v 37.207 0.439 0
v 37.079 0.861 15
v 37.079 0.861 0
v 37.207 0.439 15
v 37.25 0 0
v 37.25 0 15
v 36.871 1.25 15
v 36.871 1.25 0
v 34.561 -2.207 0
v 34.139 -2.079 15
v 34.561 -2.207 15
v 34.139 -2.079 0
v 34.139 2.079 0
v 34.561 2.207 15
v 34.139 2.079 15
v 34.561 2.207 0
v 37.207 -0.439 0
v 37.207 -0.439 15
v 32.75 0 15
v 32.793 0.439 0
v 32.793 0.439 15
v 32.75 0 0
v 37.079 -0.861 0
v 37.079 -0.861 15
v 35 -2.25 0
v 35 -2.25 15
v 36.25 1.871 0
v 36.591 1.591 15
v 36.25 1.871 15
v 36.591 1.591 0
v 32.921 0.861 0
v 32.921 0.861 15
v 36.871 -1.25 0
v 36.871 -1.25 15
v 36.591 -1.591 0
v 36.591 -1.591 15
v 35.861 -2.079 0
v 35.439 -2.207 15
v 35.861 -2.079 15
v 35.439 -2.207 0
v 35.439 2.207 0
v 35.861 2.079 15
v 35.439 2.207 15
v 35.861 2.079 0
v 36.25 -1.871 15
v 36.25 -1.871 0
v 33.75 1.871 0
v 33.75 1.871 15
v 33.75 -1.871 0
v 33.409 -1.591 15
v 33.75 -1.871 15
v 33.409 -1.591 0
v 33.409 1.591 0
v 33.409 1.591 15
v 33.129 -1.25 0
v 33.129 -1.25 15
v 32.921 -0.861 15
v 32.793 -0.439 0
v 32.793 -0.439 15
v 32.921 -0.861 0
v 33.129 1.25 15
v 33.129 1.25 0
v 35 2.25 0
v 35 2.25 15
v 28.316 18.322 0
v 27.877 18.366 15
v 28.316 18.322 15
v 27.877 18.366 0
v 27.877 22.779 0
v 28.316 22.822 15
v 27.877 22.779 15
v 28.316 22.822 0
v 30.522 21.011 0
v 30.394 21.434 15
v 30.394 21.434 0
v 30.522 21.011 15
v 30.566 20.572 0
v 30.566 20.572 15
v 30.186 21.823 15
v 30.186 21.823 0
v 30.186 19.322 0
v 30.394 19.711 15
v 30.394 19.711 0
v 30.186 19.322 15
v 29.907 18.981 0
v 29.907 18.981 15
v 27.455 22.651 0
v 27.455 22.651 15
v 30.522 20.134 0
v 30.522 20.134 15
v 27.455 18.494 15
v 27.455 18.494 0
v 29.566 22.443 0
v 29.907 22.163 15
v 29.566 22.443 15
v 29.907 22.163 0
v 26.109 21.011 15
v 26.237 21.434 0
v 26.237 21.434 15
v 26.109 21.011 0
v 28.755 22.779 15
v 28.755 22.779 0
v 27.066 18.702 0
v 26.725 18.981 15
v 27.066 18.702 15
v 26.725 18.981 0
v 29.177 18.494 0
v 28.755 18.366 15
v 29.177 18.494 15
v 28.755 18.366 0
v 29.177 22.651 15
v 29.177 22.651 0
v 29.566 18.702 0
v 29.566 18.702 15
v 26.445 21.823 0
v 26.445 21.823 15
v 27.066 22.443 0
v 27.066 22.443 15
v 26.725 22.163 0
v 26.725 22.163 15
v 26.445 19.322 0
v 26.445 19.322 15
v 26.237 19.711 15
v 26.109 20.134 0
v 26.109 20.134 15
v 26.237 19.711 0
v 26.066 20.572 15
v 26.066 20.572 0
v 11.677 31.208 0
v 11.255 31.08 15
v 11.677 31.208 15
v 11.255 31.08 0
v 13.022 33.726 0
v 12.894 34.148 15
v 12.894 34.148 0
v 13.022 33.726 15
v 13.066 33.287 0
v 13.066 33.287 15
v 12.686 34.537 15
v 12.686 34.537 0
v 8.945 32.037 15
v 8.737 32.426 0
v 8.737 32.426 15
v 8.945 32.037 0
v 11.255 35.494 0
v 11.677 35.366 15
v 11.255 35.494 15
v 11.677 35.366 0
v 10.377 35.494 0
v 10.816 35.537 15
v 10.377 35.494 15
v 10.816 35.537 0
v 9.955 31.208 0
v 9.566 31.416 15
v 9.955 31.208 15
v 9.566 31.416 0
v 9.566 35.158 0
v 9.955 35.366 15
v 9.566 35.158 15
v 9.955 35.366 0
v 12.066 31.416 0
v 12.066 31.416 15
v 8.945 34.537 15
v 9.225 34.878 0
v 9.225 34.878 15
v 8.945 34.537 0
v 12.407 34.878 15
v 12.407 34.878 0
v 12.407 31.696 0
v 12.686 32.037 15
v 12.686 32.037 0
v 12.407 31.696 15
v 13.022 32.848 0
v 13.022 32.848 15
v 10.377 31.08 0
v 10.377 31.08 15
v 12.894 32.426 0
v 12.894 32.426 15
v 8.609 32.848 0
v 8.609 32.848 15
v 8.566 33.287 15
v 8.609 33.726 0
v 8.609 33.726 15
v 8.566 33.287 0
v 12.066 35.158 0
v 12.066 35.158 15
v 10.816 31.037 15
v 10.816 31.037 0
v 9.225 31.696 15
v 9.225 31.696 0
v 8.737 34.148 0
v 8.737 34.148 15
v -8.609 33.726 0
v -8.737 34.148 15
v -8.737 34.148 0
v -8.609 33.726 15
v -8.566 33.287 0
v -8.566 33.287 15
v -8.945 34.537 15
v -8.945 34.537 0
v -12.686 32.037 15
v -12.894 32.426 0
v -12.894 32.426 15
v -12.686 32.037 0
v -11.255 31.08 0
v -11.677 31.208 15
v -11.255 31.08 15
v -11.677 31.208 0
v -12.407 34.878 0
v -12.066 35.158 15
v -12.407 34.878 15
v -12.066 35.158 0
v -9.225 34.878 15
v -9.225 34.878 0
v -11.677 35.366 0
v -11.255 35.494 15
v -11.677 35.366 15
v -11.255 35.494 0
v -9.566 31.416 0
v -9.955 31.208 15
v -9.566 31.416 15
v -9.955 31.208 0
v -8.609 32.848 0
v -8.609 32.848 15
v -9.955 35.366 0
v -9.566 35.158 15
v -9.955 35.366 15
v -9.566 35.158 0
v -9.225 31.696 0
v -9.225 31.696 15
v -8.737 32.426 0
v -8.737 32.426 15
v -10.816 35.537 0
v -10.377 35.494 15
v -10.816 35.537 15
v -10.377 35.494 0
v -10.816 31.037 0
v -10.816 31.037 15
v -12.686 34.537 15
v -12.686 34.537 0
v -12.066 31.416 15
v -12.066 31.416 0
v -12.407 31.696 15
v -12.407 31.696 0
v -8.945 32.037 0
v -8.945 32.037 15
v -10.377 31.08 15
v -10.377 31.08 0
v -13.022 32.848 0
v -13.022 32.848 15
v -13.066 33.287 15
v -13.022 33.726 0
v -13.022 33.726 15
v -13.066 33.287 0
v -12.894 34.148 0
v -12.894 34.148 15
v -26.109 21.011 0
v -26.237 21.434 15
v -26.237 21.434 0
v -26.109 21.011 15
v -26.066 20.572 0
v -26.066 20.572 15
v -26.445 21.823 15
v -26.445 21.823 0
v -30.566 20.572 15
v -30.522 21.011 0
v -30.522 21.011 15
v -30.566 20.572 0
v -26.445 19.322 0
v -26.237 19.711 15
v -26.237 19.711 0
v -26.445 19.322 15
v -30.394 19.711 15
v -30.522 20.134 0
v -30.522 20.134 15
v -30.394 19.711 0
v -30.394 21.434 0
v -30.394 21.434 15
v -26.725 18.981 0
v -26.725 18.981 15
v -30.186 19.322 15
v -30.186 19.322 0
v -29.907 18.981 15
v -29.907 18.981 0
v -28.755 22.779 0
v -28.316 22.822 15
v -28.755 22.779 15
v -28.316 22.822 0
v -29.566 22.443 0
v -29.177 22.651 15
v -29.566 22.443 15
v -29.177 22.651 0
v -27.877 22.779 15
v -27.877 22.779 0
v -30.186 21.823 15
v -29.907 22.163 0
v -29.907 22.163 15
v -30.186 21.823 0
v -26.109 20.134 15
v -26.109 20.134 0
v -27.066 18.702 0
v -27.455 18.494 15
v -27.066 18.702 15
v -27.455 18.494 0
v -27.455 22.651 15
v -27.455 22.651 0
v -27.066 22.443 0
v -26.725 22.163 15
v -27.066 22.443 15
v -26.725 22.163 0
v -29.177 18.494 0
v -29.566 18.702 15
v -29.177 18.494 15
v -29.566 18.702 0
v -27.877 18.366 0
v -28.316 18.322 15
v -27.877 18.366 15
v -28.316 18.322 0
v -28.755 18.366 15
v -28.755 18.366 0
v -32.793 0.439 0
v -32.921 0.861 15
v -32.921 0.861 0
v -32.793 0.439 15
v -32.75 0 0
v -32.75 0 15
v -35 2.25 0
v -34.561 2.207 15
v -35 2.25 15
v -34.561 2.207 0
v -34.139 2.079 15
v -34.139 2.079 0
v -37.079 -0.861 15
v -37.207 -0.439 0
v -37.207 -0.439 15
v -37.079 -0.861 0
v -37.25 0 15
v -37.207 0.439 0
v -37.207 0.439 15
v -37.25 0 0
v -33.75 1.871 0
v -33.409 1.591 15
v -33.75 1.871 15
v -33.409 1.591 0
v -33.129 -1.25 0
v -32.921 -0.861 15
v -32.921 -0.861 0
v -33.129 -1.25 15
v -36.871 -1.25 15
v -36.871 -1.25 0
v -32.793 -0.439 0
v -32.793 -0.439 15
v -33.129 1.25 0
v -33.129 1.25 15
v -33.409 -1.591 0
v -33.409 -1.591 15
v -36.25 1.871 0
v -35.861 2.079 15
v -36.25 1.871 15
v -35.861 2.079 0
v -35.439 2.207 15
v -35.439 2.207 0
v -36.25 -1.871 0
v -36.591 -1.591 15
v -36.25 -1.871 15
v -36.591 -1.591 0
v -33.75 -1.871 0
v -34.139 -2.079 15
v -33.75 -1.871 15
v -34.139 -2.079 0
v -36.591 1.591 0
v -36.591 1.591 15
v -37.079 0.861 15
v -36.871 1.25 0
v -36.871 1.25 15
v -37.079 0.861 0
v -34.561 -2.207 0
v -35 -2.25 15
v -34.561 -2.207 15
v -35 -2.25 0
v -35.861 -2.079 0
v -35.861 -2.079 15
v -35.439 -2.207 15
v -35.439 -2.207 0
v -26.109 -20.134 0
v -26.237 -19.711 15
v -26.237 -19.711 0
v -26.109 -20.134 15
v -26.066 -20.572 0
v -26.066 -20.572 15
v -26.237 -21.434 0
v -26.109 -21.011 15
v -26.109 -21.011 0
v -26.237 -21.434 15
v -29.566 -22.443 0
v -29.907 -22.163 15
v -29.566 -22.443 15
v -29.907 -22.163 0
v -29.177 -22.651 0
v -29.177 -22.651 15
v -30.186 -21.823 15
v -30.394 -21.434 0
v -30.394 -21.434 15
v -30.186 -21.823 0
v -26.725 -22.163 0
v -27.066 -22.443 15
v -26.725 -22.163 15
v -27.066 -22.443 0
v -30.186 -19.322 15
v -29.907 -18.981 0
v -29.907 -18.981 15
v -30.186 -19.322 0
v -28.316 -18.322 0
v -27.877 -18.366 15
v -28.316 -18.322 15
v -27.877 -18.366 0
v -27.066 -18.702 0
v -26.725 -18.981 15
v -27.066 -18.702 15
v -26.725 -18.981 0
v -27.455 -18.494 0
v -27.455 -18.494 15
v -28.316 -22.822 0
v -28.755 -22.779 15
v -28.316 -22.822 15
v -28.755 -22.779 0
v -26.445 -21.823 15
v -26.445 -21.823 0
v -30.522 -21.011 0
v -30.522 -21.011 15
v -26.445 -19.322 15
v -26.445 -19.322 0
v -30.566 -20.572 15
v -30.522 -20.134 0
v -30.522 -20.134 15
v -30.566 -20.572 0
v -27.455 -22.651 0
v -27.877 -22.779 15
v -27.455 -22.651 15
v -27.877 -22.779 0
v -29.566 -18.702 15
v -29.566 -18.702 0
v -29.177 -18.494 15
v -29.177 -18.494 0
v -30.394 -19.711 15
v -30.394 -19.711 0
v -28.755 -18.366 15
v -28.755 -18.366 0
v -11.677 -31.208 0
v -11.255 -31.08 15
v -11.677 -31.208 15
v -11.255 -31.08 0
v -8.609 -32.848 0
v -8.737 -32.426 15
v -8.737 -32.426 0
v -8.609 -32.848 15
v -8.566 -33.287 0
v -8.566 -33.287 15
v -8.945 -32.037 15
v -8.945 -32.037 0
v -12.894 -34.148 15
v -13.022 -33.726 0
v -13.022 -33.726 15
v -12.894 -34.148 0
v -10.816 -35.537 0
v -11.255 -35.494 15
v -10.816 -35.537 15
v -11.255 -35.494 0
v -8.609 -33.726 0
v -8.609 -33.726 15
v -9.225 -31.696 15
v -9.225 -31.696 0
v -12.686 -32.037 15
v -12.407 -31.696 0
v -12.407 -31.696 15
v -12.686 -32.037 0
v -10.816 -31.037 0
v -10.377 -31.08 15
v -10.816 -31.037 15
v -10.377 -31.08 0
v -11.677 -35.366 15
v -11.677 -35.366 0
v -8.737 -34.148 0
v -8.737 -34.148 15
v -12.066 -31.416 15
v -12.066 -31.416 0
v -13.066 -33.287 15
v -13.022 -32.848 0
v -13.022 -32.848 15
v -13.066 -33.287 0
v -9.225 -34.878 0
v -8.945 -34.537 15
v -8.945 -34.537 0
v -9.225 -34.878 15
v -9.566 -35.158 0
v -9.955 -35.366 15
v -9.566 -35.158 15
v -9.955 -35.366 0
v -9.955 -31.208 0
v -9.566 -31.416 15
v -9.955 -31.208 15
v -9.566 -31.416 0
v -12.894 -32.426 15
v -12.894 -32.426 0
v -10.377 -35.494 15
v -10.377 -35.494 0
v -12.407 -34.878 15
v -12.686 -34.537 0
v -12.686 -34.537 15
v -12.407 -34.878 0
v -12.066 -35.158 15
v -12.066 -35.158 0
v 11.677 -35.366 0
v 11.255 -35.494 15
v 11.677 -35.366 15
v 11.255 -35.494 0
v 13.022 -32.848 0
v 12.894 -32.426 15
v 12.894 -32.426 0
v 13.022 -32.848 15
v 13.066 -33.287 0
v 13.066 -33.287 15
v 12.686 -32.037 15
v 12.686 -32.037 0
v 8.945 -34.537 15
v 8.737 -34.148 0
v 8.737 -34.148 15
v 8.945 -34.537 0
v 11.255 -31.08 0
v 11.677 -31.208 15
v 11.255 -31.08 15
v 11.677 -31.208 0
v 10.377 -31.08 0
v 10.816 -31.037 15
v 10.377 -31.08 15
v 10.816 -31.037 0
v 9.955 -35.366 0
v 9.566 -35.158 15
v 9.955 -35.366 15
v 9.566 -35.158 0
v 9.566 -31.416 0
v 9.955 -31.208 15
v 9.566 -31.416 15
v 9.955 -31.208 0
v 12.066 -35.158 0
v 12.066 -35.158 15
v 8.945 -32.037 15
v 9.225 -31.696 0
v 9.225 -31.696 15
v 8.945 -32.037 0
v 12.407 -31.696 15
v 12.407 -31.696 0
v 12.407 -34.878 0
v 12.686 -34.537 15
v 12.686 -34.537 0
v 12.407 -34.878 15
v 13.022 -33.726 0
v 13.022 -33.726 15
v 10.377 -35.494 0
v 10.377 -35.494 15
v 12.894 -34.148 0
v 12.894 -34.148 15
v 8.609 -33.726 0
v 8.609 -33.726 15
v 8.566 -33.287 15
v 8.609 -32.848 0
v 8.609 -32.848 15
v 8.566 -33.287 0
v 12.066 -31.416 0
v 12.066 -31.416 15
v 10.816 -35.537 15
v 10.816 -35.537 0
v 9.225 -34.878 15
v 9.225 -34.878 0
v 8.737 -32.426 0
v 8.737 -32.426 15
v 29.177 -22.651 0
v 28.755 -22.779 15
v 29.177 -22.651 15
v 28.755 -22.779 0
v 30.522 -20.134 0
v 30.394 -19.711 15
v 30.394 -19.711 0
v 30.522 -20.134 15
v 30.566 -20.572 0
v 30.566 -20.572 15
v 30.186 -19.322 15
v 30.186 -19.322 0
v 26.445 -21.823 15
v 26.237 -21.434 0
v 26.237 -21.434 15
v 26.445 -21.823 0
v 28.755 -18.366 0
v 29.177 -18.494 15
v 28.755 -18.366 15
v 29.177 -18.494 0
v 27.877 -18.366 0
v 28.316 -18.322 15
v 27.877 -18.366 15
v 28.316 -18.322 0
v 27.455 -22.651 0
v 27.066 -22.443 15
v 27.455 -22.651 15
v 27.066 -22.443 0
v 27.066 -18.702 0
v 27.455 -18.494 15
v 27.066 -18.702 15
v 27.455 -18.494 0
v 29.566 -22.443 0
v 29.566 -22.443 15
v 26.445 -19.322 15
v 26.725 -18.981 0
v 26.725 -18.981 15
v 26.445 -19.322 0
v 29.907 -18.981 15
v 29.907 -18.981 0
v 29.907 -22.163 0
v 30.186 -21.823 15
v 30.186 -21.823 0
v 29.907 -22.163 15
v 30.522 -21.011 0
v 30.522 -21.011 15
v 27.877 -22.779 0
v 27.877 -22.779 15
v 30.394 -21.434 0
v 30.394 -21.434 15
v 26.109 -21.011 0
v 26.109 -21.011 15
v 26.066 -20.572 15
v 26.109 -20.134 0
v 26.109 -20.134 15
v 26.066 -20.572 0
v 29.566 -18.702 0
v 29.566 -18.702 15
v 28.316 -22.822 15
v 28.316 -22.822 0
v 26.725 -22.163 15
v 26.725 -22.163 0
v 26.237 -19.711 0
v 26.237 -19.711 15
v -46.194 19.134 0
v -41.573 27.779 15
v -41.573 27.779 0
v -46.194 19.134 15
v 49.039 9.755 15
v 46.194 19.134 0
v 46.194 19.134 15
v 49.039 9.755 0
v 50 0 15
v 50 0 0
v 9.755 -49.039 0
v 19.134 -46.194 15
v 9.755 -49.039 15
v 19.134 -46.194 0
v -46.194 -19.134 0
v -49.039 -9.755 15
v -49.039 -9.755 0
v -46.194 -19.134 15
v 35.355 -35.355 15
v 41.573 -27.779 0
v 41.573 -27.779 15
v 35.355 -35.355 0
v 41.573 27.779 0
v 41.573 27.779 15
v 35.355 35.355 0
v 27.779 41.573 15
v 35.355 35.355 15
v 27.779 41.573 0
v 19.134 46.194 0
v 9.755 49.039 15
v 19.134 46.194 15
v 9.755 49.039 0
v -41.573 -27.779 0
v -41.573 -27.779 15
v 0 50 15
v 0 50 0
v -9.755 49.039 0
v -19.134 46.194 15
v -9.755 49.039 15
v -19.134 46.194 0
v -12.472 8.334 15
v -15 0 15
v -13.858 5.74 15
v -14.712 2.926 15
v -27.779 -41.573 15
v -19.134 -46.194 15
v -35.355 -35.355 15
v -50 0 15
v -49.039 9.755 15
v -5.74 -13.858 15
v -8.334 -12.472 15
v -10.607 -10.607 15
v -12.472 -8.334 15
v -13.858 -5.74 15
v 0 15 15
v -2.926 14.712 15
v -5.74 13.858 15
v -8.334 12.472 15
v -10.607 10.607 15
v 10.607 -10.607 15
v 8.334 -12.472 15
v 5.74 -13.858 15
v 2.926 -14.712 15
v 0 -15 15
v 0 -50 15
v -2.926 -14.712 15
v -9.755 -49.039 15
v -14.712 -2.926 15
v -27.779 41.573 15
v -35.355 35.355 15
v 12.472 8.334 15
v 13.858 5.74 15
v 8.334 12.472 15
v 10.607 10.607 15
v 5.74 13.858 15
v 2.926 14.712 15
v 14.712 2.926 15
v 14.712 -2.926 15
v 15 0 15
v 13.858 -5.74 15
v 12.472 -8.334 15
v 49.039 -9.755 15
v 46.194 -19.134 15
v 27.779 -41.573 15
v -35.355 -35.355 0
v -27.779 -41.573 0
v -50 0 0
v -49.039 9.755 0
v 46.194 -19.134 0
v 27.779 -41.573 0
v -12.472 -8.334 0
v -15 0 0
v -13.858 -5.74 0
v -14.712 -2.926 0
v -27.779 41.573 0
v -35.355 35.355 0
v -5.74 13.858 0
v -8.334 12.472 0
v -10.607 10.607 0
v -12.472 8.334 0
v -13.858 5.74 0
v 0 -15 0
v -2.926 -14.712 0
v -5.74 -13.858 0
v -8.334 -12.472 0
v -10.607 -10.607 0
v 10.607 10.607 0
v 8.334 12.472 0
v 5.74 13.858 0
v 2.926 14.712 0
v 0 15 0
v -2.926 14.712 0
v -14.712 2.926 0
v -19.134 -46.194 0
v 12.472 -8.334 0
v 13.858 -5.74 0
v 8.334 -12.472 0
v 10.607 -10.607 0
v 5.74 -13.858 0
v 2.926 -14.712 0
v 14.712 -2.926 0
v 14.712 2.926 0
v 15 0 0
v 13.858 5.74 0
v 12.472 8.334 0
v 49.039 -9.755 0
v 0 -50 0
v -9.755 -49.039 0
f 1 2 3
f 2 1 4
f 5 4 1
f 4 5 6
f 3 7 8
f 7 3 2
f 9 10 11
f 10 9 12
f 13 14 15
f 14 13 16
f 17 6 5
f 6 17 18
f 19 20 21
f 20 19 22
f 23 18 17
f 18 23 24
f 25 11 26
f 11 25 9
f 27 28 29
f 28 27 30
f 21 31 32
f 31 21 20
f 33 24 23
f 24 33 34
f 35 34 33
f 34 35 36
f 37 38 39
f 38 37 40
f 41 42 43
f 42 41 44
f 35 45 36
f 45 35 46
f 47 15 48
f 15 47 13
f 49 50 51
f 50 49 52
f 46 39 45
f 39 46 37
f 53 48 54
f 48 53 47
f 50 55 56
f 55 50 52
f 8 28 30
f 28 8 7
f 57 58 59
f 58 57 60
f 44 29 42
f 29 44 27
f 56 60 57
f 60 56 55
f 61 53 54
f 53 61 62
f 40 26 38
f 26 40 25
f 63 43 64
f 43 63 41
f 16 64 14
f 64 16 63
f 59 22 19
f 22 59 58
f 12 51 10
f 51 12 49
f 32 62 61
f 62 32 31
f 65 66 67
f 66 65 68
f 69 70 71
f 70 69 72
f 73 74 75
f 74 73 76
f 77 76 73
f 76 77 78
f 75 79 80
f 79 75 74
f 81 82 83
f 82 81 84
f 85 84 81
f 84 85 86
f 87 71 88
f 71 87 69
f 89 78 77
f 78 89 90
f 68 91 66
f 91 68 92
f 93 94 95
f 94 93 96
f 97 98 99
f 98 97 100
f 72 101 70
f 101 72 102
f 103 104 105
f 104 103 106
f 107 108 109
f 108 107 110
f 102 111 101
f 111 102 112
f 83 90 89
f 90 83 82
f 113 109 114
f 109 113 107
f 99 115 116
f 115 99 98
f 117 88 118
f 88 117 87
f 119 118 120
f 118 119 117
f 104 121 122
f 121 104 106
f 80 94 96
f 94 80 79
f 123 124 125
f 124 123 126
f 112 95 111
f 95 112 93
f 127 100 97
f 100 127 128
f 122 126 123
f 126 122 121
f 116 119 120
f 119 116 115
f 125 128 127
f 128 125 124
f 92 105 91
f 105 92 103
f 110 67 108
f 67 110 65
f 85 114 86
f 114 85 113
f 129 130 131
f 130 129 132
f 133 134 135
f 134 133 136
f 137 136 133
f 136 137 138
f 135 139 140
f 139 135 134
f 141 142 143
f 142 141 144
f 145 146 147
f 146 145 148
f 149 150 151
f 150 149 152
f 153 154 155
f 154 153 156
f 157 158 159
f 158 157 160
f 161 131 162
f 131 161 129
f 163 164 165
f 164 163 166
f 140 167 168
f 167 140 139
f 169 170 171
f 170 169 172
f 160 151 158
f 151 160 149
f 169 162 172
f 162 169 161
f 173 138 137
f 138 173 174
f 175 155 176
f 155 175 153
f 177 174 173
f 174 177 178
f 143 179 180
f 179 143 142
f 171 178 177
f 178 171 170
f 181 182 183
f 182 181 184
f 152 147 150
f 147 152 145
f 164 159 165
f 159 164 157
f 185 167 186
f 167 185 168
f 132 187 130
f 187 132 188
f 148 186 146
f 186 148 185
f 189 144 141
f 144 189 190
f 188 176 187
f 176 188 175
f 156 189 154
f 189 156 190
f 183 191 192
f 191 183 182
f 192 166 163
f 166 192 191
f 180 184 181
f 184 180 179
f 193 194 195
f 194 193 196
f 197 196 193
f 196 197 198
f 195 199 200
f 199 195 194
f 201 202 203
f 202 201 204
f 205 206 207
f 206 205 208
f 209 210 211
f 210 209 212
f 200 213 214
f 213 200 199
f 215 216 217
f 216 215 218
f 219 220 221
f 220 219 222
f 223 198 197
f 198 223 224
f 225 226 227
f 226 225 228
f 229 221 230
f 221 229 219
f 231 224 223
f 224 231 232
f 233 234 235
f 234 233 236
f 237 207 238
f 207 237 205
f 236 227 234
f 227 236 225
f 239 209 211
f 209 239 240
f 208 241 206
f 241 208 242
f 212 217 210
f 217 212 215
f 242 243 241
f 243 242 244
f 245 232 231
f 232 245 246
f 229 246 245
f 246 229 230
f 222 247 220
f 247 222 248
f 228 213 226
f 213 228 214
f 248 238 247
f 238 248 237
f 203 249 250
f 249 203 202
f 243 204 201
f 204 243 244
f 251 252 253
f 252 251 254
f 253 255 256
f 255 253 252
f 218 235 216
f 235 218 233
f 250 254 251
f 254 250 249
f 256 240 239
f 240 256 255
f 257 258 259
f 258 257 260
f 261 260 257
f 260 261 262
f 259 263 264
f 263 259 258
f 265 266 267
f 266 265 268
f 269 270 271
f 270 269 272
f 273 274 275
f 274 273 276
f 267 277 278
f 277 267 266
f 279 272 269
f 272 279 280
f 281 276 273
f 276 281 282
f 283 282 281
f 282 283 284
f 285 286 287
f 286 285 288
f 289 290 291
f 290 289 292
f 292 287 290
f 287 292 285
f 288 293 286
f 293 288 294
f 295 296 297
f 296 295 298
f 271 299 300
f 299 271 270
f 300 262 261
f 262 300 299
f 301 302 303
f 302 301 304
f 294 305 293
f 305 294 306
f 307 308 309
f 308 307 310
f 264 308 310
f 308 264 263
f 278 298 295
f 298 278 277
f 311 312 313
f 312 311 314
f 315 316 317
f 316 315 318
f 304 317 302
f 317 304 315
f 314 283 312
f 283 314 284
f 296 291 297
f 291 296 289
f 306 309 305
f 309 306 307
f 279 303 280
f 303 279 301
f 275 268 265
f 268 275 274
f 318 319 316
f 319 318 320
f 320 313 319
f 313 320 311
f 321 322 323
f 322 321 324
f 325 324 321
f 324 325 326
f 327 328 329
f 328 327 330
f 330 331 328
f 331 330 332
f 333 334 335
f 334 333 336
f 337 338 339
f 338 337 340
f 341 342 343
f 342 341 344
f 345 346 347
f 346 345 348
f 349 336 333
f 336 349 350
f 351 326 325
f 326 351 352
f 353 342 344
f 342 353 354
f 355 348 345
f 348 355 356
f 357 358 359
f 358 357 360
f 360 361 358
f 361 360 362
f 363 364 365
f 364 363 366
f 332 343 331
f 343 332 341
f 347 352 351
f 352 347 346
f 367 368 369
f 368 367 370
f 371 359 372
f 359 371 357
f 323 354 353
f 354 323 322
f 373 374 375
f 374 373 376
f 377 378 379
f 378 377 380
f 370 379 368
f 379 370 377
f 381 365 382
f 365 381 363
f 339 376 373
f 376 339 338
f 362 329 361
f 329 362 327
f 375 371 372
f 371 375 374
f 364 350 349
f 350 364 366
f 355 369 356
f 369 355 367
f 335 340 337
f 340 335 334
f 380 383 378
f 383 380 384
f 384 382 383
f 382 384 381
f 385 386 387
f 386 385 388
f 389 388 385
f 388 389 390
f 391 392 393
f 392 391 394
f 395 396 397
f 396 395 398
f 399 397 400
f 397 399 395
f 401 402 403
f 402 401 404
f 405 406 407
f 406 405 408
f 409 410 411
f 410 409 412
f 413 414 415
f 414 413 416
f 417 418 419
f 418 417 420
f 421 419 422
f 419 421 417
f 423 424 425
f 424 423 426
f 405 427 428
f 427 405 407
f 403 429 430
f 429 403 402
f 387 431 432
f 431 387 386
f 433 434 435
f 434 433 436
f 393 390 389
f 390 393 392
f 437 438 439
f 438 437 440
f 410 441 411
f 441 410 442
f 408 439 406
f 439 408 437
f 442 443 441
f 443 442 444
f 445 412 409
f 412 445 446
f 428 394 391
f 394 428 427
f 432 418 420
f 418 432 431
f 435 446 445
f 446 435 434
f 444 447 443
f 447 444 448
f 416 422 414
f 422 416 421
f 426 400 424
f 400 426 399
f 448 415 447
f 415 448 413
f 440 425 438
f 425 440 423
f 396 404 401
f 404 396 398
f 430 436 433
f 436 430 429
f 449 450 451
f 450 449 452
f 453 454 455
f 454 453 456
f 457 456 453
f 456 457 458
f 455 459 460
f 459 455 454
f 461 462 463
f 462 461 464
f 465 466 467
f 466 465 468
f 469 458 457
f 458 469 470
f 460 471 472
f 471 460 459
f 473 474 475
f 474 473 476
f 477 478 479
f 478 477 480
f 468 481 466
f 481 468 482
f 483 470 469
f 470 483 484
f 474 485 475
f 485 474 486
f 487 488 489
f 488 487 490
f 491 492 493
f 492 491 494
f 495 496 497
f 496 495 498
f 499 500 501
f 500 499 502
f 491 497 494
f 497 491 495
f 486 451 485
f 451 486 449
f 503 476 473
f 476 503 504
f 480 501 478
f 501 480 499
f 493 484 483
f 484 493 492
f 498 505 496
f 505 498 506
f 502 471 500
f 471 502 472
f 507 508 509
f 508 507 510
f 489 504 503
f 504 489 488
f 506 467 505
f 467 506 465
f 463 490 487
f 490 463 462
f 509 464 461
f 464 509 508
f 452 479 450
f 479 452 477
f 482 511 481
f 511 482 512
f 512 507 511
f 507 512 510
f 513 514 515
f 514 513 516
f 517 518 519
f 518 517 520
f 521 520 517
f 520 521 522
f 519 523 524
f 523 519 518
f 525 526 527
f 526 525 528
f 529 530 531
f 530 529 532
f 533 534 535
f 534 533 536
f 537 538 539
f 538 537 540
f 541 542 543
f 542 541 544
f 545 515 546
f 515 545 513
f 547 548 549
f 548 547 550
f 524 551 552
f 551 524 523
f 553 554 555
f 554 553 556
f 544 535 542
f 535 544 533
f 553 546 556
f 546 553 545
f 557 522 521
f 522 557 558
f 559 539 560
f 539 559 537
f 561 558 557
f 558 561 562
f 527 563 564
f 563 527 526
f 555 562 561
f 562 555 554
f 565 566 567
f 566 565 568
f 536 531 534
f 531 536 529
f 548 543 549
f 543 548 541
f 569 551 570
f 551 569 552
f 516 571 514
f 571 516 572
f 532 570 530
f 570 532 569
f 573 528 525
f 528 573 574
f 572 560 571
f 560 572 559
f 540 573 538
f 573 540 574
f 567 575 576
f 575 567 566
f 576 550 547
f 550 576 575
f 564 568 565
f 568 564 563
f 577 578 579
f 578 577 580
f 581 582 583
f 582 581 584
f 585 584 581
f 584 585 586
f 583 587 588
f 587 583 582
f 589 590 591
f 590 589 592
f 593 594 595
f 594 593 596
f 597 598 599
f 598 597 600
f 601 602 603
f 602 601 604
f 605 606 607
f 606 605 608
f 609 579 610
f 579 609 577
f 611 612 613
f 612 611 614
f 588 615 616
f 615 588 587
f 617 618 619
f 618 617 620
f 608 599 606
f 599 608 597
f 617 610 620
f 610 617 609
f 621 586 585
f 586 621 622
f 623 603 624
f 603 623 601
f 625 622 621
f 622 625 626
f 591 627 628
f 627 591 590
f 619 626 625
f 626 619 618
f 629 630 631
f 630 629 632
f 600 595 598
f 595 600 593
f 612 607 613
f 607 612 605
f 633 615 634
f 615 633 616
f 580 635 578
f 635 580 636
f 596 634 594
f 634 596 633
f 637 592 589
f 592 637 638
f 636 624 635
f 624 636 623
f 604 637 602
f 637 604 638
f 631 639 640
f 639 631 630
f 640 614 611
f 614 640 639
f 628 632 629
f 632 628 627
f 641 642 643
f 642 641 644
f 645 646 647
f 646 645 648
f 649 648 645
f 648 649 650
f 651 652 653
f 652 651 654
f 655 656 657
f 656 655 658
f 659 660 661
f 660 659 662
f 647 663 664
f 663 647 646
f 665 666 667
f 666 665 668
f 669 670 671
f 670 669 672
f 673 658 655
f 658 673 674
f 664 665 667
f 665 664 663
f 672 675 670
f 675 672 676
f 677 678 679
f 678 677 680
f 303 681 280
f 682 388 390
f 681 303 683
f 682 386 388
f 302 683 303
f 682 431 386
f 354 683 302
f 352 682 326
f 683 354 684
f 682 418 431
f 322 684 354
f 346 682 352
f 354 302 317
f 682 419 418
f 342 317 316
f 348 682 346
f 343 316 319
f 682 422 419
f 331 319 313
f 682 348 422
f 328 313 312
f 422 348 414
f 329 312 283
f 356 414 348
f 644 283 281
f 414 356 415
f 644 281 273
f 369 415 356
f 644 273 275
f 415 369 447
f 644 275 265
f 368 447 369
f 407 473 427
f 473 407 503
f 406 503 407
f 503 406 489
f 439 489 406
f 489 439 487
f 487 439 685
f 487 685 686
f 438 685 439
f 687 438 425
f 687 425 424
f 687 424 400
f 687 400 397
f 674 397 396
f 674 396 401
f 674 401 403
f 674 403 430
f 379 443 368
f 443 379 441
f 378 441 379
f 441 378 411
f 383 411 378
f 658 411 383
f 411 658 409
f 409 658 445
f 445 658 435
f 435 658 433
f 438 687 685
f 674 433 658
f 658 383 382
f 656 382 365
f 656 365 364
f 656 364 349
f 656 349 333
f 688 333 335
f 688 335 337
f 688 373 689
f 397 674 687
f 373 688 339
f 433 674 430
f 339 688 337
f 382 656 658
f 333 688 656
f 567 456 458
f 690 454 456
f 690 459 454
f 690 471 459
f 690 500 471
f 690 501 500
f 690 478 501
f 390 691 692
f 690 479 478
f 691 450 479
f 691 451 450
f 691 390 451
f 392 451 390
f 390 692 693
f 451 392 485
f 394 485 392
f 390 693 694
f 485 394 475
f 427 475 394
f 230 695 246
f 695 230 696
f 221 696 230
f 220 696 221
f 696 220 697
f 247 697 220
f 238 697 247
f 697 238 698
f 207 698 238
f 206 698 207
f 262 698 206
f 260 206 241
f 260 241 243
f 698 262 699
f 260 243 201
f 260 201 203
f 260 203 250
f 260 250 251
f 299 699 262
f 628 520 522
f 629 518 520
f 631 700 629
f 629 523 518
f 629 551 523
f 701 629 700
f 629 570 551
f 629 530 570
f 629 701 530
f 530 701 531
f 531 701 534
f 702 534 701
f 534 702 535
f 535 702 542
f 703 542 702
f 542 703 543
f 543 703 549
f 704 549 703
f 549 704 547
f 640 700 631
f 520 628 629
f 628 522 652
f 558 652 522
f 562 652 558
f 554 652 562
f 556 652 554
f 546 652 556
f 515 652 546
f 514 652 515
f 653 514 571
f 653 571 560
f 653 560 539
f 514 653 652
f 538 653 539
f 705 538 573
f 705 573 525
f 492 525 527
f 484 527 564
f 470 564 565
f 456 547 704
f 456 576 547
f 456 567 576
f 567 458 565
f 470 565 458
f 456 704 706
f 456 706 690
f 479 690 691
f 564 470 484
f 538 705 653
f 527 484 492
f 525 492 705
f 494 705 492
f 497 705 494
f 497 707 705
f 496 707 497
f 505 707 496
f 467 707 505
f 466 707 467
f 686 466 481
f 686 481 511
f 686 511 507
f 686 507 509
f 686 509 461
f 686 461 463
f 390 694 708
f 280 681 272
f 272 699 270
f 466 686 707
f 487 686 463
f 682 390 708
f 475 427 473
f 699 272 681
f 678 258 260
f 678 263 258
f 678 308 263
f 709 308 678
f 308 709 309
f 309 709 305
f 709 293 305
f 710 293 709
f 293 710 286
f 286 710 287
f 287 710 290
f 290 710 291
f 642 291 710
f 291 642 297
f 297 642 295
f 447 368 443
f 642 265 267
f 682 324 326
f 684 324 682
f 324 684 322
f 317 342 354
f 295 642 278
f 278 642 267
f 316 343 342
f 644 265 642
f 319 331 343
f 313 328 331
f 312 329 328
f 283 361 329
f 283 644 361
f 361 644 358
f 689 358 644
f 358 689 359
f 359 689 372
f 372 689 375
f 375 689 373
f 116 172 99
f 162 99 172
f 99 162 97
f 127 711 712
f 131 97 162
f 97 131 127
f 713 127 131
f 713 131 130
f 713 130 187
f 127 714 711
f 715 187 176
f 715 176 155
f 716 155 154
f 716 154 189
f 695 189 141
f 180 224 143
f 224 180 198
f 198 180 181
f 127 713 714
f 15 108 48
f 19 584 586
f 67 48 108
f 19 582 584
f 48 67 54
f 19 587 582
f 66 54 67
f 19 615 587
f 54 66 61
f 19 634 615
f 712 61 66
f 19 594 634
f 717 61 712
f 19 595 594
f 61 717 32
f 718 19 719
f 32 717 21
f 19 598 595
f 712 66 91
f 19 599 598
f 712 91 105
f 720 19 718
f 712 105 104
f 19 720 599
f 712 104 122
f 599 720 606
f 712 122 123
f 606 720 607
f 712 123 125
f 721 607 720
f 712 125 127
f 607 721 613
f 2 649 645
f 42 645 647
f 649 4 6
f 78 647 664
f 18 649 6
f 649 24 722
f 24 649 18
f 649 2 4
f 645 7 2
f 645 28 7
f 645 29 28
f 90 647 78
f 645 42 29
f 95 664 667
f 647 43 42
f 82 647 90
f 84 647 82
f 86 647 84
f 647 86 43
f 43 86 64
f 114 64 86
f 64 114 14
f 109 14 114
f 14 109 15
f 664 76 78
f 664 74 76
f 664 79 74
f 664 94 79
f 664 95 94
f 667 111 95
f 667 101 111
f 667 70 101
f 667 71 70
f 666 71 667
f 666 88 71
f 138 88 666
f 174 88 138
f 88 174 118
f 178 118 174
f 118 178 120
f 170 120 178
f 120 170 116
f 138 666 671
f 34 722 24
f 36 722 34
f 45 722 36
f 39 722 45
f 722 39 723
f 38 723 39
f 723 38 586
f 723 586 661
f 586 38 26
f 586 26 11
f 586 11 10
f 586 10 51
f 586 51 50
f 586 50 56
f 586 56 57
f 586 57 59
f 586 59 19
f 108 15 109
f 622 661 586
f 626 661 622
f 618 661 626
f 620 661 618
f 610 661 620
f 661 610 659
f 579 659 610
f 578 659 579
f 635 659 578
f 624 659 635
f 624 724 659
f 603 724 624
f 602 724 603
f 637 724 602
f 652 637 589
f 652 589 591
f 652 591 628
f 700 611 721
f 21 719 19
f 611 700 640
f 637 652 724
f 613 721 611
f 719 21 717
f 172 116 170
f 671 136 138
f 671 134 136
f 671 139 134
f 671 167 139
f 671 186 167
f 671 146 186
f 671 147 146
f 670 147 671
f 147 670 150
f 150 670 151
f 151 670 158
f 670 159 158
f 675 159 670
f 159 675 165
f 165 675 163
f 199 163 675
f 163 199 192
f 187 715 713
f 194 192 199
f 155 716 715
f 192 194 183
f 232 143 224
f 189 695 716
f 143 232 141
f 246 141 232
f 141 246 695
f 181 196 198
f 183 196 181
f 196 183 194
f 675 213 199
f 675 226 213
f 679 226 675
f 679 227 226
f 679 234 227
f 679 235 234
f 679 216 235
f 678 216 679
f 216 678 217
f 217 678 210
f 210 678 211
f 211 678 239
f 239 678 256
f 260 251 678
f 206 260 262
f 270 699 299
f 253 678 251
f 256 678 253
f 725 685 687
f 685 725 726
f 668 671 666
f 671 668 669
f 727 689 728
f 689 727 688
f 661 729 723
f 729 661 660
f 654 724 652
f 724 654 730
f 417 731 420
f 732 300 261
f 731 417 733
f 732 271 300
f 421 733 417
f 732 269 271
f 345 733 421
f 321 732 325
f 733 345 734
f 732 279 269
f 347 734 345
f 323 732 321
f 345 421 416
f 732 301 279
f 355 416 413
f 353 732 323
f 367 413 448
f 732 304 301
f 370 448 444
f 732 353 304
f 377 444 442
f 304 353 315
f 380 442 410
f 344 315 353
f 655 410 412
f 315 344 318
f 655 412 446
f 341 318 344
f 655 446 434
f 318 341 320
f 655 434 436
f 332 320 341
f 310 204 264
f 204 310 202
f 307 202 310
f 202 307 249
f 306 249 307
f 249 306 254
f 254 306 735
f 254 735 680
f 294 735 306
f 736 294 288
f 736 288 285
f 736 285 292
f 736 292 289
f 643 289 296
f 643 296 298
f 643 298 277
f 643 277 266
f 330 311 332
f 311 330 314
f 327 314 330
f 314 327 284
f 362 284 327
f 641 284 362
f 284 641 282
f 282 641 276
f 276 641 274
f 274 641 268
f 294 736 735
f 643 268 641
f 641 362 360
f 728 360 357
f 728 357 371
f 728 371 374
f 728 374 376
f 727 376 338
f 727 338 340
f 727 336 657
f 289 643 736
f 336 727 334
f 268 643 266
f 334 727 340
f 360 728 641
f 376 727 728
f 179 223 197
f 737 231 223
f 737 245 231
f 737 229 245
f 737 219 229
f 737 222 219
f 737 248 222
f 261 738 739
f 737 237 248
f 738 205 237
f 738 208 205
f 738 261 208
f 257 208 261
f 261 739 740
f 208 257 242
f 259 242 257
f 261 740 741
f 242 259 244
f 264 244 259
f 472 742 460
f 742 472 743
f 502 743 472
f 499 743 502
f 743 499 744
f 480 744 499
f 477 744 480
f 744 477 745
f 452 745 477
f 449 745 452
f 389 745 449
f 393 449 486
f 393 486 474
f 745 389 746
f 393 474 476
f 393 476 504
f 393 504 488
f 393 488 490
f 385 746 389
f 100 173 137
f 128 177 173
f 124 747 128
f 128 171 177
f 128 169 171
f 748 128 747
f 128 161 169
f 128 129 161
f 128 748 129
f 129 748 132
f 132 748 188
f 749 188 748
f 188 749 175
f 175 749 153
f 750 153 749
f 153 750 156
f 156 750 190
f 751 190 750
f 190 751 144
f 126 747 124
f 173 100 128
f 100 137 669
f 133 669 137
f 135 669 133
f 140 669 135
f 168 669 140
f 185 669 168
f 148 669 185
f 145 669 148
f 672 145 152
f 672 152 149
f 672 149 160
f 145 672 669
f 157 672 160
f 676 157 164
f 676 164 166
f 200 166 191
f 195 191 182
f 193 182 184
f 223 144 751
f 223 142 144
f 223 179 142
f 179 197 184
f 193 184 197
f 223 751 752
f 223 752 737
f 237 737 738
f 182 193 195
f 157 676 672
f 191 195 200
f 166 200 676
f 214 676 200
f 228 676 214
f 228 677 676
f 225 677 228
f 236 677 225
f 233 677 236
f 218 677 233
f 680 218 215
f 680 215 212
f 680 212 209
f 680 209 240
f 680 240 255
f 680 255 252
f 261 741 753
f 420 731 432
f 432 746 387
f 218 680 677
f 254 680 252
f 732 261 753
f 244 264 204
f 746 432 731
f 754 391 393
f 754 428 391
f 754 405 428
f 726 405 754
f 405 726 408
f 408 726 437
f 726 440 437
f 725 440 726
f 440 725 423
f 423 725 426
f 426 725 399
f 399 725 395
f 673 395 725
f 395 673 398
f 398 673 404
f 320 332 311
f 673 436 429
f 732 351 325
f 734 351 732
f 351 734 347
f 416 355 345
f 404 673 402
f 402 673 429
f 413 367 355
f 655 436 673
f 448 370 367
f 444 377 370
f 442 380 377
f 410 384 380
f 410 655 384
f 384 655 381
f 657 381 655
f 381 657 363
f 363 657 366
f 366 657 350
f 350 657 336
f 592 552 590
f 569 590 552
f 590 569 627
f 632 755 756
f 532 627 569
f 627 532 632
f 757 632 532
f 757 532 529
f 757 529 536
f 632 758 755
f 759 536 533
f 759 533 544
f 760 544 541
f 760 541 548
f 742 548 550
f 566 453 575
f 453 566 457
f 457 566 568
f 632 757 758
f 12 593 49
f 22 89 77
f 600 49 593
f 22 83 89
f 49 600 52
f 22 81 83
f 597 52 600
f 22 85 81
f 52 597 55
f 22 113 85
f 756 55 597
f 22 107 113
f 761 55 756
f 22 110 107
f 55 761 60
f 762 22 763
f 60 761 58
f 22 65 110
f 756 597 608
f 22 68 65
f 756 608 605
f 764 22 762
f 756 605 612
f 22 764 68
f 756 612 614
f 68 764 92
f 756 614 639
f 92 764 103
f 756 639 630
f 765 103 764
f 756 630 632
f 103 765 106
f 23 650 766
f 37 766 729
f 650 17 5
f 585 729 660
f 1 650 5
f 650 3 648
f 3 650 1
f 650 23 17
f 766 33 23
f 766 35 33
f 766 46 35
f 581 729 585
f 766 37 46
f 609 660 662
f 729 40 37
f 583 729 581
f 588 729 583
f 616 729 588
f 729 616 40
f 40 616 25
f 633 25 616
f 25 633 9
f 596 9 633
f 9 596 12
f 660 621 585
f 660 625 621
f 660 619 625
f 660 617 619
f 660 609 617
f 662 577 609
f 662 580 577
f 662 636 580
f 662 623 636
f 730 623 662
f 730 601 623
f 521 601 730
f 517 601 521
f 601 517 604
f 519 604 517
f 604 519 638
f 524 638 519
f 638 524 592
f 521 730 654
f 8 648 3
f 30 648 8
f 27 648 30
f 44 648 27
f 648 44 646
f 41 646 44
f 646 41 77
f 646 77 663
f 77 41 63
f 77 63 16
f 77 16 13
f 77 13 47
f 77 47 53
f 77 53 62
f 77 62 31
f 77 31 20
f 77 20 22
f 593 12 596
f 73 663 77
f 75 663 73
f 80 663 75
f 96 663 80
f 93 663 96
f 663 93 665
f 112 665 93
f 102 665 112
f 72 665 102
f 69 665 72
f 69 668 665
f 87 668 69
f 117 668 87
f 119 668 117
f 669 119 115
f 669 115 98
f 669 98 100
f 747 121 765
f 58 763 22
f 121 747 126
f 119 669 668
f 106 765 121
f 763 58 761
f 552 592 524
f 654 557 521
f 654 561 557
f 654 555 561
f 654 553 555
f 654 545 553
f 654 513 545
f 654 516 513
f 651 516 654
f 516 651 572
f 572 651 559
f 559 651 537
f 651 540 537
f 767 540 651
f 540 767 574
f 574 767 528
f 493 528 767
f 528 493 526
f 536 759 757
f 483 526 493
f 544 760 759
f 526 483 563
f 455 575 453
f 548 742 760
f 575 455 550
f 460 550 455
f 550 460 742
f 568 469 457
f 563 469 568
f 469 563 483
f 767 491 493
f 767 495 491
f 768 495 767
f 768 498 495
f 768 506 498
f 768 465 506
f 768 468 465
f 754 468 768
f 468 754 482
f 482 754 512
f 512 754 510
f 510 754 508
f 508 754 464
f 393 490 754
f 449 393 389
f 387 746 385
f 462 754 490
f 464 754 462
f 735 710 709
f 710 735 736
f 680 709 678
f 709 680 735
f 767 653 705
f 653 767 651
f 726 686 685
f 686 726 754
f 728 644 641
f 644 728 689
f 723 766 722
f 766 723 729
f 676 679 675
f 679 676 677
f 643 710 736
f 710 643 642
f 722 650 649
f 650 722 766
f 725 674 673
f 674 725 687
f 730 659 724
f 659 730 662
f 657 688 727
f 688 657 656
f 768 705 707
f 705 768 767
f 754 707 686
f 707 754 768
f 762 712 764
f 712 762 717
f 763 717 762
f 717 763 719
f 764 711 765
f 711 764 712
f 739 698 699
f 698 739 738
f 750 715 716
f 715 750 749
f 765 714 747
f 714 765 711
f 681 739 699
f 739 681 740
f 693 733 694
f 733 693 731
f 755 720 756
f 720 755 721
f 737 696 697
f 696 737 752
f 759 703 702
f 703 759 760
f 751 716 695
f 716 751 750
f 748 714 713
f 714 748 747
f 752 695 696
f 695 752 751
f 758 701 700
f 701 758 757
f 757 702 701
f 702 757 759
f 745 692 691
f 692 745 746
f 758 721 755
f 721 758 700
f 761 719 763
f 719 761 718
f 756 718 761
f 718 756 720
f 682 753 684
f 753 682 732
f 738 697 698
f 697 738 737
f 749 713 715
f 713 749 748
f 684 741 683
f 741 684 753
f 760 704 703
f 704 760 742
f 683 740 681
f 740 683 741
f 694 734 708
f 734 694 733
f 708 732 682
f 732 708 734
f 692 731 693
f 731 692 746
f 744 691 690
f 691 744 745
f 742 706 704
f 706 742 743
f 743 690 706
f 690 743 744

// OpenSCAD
$fn = 32;

// ----------------------------------------------------------------------
// Flange Ø100 x 15
// 10 holes on a Ø70 bolt circle, bolted joints
// ----------------------------------------------------------------------

// --- parameters (mm) ---
flange_d = 100;  // outside diameter of the flange
thickness = 15;  // flange thickness
holes = 10;      // number of bolt holes
pcd = 70;        // bolt circle diameter
start_deg = 0;   // angle of the first hole, from +X
hole_d = 4.5;    // bolt hole diameter
bore_d = 30;     // central through bore
hub_d = 42;      // hub outside diameter
hub_h = 0;       // hub height above the flange face (0 = no hub)

// --- derived feature positions (mm) ---
height = thickness + hub_h;  // = 15   overall height of the part
pcd_r = pcd / 2;             // = 35   bolt circle radius
hole_step = 360 / holes;     // = 36   angular pitch
feature_centers = [
  [pcd_r * cos(start_deg + 0 * hole_step), pcd_r * sin(start_deg + 0 * hole_step)],
  [pcd_r * cos(start_deg + 1 * hole_step), pcd_r * sin(start_deg + 1 * hole_step)],
  [pcd_r * cos(start_deg + 2 * hole_step), pcd_r * sin(start_deg + 2 * hole_step)],
  [pcd_r * cos(start_deg + 3 * hole_step), pcd_r * sin(start_deg + 3 * hole_step)],
  [pcd_r * cos(start_deg + 4 * hole_step), pcd_r * sin(start_deg + 4 * hole_step)],
  [pcd_r * cos(start_deg + 5 * hole_step), pcd_r * sin(start_deg + 5 * hole_step)],
  [pcd_r * cos(start_deg + 6 * hole_step), pcd_r * sin(start_deg + 6 * hole_step)],
  [pcd_r * cos(start_deg + 7 * hole_step), pcd_r * sin(start_deg + 7 * hole_step)],
  [pcd_r * cos(start_deg + 8 * hole_step), pcd_r * sin(start_deg + 8 * hole_step)],
  [pcd_r * cos(start_deg + 9 * hole_step), pcd_r * sin(start_deg + 9 * hole_step)]
];   // bolt hole centres on the pitch circle

// flange disc, every hole and the bore cut straight through
difference() {
  union() {
    cylinder(d = flange_d, h = thickness);
  }
  translate([0, 0, -1]) cylinder(d = bore_d, h = height + 2);  // bore, through
  for (centre = feature_centers)
    translate([centre[0], centre[1], -1]) cylinder(d = hole_d, h = thickness + 2);
}
